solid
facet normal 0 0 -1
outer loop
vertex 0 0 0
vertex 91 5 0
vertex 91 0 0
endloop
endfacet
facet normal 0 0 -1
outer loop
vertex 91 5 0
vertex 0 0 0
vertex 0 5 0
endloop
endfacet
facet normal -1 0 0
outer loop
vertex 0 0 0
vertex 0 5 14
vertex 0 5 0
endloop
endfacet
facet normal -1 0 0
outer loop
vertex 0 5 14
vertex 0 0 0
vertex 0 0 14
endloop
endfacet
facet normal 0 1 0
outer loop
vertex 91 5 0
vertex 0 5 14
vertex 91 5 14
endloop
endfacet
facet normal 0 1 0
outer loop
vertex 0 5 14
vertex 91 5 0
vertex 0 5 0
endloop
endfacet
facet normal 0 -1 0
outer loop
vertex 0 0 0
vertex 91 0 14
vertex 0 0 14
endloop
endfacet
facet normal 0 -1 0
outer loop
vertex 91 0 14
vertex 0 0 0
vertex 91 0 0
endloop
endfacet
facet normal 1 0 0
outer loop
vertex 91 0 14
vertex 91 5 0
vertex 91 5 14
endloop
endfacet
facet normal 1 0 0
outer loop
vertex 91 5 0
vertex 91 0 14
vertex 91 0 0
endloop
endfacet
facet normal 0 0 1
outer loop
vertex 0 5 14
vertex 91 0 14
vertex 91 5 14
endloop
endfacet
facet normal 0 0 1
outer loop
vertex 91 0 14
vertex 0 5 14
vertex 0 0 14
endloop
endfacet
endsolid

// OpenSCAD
translate([3.5, 2.5, 5.5]) color([0.21571394075115613, 0.3554013630116646, 0.39096604949642]) cube([7, 5, 11], center=true);
translate([10.5, 2.5, 5.5]) color([0.9928835035123682, 0.8462248334797323, 0.9789066021625461]) cube([7, 5, 11], center=true);
translate([17.5, 2.5, 5.5]) color([0.6868956228130294, 0.08137290691060206, 0.9493092651810784]) cube([7, 5, 11], center=true);
translate([24.5, 2.5, 5.5]) color([0.9246190463677613, 0.3951154575230438, 0.3612783181755085]) cube([7, 5, 11], center=true);
translate([31.5, 2.5, 5.5]) color([0.11615210489091876, 0.0037403702712440756, 0.2703277384724262]) cube([7, 5, 11], center=true);
translate([38.5, 2.5, 5.5]) color([0.6403732426441148, 0.29252642189785794, 0.9007258804640697]) cube([7, 5, 11], center=true);
translate([45.5, 2.5, 5.5]) color([0.14067978971908934, 0.5728503338092871, 0.1912043400515635]) cube([7, 5, 11], center=true);
translate([52.5, 2.5, 5.5]) color([0.43401891336511733, 0.7163457448050065, 0.3841301513333275]) cube([7, 5, 11], center=true);
translate([59.5, 2.5, 5.5]) color([0.33069552050314754, 0.6480049557775331, 0.6874717059379091]) cube([7, 5, 11], center=true);
translate([66.5, 2.5, 5.5]) color([0.14801928734251768, 0.93323205939552, 0.14750072005511716]) cube([7, 5, 11], center=true);
translate([73.5, 2.5, 5.5]) color([0.31607169754224296, 0.2088660889148145, 0.1868244368145192]) cube([7, 5, 11], center=true);
translate([80.5, 2.5, 5.5]) color([0.3491672112743387, 0.9834841816788549, 0.427290207198605]) cube([7, 5, 11], center=true);
translate([87.5, 2.5, 5.5]) color([0.49195852420878716, 0.7297831417632067, 0.7955834433152874]) cube([7, 5, 11], center=true);
translate([3.5, 2.5, 12.5]) color([0.43927203819181504, 0.2042687131951023, 0.709997013582239]) cube([7, 5, 3], center=true);
translate([10.5, 2.5, 12.5]) color([0.9058221085991531, 0.03327924187503195, 0.6331757983912308]) cube([7, 5, 3], center=true);
translate([17.5, 2.5, 12.5]) color([0.8710093735661795, 0.3636101637556439, 0.7431628081058981]) cube([7, 5, 3], center=true);
translate([24.5, 2.5, 12.5]) color([0.6774926049513658, 0.23306417175218364, 0.2975271762349214]) cube([7, 5, 3], center=true);
translate([31.5, 2.5, 12.5]) color([0.0866296567389645, 0.8688435220131177, 0.7514921149941085]) cube([7, 5, 3], center=true);
translate([38.5, 2.5, 12.5]) color([0.7714305883456576, 0.8829516943772963, 0.4114323292545551]) cube([7, 5, 3], center=true);
translate([45.5, 2.5, 12.5]) color([0.05394001775890156, 0.696805048854085, 0.6656296547984208]) cube([7, 5, 3], center=true);
translate([52.5, 2.5, 12.5]) color([0.6485122289860075, 0.5471816206705559, 0.7344166333532061]) cube([7, 5, 3], center=true);
translate([59.5, 2.5, 12.5]) color([0.4306045068871984, 0.45460236437769275, 0.25475221651879554]) cube([7, 5, 3], center=true);
translate([66.5, 2.5, 12.5]) color([0.47565246533915095, 0.3371942584654095, 0.04223511400675217]) cube([7, 5, 3], center=true);
translate([73.5, 2.5, 12.5]) color([0.05255331220371673, 0.34980223330761895, 0.2898096938030986]) cube([7, 5, 3], center=true);
translate([78.0, 2.5, 12.5]) color([0.007130057665757694, 0.06369015415518986, 0.42774457246440645]) cube([2, 5, 3], center=true);
translate([80.0, 2.5, 12.5]) color([0.22216650821772055, 0.6086379170158094, 0.557768500755667]) cube([2, 5, 3], center=true);
translate([82.0, 2.5, 12.5]) color([0.22097295115667703, 0.19284823789822858, 0.6083188139076446]) cube([2, 5, 3], center=true);
translate([84.0, 2.5, 12.5]) color([0.606354511401297, 0.08562053587131313, 0.31903016062772993]) cube([2, 5, 3], center=true);
translate([86.0, 2.5, 12.5]) color([0.53590115499306, 0.8934753784920533, 0.25549985489866966]) cube([2, 5, 3], center=true);
translate([88.0, 2.5, 12.5]) color([0.5219903070058861, 0.1901317713313112, 0.08011594570868696]) cube([2, 5, 3], center=true);
translate([90.0, 2.5, 12.5]) color([0.8699478397109702, 0.3457472114844995, 0.837290862214726]) cube([2, 5, 3], center=true);
